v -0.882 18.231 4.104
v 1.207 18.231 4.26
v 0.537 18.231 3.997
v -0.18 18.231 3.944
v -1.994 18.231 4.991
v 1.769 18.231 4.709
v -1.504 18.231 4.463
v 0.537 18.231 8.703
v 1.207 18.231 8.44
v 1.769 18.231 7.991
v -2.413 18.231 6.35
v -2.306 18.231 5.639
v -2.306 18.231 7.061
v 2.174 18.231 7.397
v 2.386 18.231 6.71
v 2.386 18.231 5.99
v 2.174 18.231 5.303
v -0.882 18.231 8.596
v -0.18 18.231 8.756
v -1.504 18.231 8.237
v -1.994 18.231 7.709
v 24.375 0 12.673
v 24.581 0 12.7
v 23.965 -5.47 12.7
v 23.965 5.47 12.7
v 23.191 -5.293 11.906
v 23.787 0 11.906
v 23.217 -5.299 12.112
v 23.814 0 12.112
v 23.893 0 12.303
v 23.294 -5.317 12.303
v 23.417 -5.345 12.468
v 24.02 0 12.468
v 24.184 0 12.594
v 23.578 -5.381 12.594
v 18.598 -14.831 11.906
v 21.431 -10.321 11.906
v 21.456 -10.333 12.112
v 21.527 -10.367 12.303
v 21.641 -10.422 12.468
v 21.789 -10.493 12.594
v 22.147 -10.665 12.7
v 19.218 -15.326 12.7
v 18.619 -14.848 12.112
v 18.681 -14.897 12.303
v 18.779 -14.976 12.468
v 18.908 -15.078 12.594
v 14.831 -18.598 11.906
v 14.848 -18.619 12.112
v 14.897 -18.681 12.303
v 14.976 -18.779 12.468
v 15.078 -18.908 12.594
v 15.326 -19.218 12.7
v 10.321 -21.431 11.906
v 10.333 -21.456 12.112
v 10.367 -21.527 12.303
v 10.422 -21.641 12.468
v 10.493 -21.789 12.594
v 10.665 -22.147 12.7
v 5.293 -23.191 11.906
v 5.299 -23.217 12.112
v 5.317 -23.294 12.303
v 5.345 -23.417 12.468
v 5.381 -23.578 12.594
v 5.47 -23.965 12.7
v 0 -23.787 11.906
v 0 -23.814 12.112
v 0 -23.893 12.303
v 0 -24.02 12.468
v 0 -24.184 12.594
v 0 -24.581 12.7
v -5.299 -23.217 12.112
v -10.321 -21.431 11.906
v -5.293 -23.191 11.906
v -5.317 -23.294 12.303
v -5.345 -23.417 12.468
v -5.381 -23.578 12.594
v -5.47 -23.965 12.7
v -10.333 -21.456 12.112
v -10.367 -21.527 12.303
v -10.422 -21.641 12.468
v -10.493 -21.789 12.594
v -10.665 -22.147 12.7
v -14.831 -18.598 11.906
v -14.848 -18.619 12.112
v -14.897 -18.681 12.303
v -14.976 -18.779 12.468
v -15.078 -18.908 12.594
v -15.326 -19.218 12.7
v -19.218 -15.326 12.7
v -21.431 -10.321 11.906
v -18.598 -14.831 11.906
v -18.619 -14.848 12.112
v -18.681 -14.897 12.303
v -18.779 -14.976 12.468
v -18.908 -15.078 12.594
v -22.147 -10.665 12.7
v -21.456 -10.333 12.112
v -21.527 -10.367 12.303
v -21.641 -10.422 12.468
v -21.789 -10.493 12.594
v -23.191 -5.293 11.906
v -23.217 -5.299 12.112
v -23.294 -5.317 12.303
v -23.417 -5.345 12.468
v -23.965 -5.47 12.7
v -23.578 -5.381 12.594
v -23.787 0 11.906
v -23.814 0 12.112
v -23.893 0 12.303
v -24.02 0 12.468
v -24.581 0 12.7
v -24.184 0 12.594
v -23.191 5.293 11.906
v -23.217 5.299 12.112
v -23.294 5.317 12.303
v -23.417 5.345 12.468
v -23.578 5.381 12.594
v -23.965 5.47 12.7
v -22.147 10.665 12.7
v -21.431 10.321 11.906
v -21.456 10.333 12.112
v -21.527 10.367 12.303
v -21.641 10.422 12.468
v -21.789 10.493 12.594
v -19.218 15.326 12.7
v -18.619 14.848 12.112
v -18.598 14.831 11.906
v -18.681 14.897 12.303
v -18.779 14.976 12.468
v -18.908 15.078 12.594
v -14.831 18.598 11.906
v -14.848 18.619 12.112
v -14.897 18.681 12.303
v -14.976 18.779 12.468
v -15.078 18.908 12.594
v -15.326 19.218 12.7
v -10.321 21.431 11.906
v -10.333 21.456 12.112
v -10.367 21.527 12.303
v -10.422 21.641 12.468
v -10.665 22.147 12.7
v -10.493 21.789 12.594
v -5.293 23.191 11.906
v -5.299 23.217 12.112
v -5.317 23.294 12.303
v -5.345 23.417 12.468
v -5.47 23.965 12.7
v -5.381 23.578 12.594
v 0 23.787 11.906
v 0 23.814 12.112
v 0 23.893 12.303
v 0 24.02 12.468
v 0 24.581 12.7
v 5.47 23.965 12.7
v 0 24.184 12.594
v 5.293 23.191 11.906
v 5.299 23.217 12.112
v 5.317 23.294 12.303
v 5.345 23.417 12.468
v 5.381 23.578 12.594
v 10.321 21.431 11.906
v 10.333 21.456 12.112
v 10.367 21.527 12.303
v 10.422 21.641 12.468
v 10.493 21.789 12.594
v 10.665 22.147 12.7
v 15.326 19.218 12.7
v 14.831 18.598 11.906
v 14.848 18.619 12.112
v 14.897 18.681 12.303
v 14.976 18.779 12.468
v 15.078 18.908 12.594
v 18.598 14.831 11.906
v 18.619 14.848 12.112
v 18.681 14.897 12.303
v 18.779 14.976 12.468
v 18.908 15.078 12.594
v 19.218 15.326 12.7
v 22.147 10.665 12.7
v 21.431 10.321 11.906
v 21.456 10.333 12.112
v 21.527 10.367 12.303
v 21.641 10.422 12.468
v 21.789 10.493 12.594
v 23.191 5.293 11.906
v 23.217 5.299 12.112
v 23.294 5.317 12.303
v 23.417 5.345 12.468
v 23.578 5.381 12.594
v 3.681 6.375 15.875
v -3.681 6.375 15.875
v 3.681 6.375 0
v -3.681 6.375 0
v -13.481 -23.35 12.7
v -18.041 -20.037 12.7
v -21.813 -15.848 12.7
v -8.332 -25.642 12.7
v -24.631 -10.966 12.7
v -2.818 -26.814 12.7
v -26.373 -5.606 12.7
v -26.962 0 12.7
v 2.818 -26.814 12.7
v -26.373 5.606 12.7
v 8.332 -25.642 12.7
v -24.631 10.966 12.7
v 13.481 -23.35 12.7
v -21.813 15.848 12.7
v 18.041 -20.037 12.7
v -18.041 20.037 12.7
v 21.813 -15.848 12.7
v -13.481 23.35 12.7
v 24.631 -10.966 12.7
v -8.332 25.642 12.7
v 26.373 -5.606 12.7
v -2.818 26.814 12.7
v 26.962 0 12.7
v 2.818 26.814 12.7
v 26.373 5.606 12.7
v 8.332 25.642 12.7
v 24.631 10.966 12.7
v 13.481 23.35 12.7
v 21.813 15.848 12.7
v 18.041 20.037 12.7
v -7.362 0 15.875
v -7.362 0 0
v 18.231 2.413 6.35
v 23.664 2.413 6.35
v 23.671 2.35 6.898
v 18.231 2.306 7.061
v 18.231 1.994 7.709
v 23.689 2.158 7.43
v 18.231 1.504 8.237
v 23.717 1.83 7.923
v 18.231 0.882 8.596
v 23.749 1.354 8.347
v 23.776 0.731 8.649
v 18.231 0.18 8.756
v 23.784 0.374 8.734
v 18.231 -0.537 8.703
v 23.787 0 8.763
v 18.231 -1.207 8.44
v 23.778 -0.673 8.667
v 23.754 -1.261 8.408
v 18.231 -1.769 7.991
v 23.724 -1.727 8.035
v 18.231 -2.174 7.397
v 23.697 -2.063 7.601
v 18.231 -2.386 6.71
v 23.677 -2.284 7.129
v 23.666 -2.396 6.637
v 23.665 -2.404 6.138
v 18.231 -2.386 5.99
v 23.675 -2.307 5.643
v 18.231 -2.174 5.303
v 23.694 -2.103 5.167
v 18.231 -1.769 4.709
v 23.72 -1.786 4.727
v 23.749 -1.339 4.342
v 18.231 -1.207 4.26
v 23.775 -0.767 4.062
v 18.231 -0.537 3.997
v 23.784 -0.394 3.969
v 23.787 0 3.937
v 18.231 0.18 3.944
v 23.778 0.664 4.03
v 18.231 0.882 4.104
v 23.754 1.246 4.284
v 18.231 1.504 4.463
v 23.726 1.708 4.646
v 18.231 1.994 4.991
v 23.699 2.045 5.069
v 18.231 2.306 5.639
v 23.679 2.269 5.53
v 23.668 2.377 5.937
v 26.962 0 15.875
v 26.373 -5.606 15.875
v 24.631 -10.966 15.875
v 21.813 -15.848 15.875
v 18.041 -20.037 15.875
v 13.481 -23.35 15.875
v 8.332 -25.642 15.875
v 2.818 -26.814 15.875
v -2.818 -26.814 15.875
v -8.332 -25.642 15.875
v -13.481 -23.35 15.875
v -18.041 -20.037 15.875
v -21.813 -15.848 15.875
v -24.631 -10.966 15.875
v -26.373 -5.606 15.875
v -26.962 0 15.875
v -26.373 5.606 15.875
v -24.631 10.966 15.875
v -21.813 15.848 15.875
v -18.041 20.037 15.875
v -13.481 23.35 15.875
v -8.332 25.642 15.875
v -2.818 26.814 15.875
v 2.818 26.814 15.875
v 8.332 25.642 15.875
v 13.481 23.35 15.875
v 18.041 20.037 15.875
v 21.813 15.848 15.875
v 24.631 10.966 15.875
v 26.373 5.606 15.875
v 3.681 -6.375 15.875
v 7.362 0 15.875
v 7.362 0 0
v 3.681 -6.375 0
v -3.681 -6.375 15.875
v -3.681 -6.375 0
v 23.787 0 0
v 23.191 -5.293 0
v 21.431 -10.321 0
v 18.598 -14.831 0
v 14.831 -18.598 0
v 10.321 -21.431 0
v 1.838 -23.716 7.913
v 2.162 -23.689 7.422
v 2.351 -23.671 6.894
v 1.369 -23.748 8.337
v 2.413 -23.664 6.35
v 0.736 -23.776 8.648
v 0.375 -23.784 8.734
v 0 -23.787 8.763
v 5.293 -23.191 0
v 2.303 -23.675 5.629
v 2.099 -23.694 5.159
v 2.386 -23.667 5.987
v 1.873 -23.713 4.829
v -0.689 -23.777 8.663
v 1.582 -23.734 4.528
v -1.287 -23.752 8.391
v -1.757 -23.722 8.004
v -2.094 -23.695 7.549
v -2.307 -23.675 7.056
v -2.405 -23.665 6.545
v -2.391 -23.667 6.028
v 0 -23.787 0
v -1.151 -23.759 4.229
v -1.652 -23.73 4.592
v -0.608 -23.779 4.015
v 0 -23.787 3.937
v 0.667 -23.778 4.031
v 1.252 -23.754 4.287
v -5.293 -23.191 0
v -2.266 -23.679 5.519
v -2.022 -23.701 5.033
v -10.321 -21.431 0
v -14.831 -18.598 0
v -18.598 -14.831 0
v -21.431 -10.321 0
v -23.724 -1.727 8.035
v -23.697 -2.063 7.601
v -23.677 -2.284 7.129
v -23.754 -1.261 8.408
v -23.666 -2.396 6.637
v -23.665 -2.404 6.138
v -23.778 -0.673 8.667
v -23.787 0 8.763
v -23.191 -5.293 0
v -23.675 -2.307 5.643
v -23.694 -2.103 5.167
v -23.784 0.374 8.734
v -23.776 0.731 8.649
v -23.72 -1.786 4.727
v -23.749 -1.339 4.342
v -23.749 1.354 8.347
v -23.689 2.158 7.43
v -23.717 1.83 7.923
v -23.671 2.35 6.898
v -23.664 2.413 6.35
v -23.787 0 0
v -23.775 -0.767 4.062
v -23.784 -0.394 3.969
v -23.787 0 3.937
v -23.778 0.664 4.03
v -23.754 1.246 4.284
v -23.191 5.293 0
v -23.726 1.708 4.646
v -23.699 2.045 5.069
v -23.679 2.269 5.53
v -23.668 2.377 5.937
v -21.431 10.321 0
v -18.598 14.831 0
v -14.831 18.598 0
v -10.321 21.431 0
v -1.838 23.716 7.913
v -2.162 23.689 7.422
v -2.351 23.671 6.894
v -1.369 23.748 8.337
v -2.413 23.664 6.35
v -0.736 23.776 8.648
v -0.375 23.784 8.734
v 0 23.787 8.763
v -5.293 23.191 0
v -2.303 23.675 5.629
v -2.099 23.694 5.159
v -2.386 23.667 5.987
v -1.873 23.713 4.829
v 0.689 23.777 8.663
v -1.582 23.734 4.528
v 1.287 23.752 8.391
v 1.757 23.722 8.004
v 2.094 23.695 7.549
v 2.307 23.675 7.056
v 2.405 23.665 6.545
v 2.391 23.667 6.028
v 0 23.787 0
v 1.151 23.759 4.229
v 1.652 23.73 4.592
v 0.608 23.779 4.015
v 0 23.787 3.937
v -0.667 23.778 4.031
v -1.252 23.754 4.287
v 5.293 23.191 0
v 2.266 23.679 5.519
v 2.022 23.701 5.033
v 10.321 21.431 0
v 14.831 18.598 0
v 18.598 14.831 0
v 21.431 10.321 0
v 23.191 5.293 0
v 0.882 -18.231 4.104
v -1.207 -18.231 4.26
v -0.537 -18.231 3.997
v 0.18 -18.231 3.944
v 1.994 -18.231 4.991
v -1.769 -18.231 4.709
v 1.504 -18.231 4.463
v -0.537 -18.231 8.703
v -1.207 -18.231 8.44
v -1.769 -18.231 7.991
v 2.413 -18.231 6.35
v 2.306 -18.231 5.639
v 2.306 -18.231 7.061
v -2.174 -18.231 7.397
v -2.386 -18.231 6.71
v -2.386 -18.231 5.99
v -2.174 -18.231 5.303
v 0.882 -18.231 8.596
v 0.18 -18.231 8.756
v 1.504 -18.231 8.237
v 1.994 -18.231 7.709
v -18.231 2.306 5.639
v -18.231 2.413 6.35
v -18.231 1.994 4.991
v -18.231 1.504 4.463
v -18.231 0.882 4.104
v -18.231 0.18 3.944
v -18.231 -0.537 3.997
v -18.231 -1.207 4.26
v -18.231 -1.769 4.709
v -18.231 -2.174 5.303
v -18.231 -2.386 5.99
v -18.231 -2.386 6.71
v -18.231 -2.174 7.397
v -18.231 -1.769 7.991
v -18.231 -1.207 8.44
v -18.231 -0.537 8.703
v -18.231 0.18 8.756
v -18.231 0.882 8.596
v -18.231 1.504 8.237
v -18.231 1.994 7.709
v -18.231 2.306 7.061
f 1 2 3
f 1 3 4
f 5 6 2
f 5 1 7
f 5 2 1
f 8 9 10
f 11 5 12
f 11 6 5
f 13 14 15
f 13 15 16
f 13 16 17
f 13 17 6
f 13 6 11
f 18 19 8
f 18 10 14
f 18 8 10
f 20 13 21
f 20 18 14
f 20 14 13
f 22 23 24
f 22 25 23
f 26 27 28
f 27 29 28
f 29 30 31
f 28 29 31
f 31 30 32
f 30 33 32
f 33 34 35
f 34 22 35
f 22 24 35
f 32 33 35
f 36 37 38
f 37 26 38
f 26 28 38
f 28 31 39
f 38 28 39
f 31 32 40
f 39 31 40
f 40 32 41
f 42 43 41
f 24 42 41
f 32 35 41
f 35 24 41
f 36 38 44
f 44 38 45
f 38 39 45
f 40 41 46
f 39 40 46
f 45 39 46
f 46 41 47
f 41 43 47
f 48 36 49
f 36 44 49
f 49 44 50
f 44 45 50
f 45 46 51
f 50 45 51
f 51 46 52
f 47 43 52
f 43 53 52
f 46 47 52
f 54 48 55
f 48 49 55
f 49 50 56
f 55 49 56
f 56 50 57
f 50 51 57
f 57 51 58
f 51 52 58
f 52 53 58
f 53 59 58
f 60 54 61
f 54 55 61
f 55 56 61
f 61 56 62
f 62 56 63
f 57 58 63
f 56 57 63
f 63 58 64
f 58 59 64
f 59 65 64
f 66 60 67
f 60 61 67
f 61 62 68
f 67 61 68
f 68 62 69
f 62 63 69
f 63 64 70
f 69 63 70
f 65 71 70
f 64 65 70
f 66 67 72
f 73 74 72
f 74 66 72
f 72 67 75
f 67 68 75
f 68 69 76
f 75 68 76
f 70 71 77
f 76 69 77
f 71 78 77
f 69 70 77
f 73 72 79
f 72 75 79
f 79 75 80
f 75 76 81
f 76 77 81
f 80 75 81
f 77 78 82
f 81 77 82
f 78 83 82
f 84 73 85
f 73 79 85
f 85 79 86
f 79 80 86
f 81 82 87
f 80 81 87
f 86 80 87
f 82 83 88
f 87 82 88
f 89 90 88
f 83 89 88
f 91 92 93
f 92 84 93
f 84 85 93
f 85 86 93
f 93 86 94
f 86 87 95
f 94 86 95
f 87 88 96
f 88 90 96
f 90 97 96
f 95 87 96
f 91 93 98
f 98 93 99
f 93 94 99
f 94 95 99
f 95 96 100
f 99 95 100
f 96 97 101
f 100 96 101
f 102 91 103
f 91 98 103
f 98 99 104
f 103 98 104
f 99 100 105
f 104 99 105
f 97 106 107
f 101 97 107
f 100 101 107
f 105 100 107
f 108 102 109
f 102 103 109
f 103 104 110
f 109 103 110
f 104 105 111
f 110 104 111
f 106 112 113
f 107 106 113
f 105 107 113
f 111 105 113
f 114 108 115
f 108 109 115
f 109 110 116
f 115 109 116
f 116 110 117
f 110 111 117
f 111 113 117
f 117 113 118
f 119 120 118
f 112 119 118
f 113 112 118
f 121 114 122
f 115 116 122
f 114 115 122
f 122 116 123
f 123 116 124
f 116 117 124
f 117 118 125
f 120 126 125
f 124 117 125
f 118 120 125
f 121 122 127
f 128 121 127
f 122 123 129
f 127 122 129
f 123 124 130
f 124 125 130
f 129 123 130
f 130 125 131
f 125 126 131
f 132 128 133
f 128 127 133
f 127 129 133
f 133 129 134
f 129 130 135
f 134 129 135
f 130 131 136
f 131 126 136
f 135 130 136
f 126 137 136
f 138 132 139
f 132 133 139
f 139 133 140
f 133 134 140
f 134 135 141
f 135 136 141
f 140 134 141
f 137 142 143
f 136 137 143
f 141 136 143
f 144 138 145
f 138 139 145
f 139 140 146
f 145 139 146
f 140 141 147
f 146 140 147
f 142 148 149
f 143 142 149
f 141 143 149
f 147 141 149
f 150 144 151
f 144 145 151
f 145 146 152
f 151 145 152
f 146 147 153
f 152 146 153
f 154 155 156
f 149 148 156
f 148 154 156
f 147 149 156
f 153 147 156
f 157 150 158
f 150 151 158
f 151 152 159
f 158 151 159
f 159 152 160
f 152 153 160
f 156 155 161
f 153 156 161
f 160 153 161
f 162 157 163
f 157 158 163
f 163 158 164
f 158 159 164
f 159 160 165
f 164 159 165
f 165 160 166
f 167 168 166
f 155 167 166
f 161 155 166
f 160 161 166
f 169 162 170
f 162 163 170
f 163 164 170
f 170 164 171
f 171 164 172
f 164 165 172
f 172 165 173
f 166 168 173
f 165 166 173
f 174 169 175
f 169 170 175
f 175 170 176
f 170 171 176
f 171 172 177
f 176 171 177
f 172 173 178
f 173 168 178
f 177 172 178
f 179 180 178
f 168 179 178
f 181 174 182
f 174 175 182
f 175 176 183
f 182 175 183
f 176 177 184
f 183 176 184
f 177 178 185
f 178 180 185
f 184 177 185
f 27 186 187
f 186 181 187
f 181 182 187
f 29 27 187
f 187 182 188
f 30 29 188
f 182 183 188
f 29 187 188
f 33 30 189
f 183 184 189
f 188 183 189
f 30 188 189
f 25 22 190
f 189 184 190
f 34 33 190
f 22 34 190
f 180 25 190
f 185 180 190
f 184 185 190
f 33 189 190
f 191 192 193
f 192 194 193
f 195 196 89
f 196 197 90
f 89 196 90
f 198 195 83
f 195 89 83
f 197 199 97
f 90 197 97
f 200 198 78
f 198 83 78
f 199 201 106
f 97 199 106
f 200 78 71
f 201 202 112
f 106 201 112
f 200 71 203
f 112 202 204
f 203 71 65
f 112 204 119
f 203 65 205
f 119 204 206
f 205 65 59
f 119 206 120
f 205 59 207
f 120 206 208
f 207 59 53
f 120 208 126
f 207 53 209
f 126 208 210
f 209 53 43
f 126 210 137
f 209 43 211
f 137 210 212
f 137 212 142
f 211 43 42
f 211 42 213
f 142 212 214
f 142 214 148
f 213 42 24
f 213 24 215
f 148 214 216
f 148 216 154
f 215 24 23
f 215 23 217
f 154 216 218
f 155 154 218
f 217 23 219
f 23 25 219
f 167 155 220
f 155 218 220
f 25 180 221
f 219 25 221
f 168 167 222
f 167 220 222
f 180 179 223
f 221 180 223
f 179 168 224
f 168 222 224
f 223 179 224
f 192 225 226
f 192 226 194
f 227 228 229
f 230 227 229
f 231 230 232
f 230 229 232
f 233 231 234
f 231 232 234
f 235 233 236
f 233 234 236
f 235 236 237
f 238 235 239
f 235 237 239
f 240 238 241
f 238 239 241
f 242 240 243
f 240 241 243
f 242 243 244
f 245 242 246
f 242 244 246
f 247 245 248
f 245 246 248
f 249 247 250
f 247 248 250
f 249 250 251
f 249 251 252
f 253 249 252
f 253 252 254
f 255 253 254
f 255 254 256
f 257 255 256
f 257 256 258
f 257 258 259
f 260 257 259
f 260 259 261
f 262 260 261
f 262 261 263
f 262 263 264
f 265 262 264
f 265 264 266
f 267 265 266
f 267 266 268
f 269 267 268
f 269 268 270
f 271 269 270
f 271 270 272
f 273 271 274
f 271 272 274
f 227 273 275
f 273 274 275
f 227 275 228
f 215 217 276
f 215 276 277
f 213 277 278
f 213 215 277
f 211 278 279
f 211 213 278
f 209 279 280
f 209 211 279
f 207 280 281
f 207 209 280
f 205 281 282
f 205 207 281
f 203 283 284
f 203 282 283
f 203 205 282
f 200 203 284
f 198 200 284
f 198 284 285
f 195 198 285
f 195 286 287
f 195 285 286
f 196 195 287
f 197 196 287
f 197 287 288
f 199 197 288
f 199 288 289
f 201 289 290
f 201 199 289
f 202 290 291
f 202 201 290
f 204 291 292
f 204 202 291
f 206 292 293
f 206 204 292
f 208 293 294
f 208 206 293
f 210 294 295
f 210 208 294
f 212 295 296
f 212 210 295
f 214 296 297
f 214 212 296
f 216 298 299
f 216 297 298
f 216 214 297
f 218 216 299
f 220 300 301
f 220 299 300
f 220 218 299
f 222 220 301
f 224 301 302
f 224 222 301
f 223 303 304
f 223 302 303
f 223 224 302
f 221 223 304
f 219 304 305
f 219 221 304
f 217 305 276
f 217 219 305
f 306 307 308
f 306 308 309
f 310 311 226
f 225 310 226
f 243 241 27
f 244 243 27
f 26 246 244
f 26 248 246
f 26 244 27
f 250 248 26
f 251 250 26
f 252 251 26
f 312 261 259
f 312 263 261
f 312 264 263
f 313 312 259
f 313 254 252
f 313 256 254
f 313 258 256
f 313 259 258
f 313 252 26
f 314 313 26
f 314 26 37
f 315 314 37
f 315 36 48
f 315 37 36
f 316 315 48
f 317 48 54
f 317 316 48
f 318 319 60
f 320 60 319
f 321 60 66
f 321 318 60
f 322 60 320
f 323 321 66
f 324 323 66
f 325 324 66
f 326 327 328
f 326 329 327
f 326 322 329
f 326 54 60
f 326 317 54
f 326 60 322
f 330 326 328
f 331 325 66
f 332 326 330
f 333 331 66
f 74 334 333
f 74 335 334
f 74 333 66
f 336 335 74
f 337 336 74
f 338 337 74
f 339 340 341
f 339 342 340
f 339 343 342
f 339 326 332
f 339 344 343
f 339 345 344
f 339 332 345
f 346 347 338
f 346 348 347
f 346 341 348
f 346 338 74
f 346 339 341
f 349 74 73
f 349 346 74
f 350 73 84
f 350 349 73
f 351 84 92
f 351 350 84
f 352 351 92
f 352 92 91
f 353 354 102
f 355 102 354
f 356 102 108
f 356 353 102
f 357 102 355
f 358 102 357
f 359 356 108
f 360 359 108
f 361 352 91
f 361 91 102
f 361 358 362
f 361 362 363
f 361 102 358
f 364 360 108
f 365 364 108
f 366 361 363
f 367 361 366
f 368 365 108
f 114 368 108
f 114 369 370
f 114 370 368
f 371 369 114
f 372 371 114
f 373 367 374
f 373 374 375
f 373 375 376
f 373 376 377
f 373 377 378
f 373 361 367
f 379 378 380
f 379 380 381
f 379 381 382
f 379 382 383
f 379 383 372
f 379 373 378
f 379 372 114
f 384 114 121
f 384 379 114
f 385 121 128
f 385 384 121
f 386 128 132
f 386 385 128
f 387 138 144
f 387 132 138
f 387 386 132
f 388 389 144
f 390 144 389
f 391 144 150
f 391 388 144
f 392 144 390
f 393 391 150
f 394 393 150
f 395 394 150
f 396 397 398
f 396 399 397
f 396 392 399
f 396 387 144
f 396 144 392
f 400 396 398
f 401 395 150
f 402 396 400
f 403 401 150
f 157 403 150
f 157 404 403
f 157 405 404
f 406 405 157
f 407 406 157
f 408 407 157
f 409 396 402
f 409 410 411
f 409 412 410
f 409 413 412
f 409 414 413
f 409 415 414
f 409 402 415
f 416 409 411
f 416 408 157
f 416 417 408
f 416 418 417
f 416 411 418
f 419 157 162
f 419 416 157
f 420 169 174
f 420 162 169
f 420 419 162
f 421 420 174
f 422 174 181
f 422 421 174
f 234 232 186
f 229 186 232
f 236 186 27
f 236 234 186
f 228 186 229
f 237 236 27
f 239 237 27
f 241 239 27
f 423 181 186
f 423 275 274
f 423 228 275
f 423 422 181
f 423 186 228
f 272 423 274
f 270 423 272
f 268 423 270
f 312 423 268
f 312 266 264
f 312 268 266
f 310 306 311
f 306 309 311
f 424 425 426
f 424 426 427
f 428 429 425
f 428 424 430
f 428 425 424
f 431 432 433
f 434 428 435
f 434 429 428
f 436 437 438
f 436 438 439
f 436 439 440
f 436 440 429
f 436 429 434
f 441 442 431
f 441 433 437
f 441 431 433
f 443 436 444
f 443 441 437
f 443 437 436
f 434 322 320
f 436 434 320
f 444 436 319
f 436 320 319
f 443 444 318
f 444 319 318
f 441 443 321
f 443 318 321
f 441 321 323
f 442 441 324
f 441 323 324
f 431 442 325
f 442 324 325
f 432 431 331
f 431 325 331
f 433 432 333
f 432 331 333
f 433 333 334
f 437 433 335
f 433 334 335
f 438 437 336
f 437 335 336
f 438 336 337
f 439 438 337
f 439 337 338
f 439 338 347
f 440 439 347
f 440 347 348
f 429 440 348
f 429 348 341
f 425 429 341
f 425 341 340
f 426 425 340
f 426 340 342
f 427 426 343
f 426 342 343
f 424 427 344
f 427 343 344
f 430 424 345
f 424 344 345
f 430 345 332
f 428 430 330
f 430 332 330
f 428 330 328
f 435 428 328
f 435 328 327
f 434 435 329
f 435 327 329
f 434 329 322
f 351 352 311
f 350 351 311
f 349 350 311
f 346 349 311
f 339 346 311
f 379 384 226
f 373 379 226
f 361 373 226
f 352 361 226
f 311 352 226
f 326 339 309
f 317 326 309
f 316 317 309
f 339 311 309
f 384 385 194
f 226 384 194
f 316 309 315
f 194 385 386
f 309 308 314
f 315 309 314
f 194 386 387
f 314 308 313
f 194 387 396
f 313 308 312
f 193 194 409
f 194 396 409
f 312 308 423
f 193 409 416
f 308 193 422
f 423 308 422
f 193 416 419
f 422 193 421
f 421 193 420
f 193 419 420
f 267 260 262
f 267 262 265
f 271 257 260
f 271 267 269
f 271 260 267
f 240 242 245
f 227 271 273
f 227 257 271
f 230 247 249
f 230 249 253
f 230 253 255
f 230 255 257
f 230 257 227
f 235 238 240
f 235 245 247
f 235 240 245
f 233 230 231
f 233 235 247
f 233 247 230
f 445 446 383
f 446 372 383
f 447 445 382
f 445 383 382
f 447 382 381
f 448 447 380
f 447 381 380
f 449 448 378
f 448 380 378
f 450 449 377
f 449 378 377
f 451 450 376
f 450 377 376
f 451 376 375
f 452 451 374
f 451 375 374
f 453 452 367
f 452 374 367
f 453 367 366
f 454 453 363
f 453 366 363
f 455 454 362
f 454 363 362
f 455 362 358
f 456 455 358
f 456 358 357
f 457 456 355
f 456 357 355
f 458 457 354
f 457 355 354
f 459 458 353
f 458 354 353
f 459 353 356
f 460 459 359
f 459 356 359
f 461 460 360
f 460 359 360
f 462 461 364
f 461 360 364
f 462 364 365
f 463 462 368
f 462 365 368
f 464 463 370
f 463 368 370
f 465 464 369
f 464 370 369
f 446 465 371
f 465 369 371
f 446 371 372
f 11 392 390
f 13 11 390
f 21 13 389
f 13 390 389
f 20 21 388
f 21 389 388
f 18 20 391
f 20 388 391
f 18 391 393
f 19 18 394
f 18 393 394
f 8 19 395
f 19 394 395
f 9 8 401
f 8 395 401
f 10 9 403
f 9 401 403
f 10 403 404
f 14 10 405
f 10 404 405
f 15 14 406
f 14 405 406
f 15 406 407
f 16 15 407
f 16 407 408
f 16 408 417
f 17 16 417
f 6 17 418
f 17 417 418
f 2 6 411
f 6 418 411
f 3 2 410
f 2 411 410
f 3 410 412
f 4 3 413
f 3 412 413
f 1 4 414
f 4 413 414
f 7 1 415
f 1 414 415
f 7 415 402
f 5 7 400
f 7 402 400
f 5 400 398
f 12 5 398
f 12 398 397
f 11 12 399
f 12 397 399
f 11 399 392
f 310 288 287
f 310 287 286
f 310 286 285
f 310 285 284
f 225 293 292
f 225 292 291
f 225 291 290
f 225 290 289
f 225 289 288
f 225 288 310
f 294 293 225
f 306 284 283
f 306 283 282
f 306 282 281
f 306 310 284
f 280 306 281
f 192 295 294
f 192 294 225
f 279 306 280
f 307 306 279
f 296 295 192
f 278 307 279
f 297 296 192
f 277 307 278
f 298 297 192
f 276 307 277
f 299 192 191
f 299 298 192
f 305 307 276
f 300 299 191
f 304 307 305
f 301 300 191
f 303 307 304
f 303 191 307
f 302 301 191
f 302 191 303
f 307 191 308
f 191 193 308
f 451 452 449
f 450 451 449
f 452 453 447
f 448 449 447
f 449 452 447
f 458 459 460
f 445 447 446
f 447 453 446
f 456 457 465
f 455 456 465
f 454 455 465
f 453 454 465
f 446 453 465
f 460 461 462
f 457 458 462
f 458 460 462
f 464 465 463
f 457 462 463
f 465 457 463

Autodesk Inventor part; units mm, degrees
sketch "Sketch1" plane through (0, 0, 0) normal (0, 0, 1) x (1, 0, 0)
  circle A0 centre (0, 0) radius 23.7871
  line L0 (3.6808, 6.3754) -> (7.3617, 0)
  line L1 (7.3617, 0) -> (3.6808, -6.3754)
  line L2 (3.6808, -6.3754) -> (-3.6808, -6.3754)
  line L3 (-3.6808, -6.3754) -> (-7.3617, 0)
  line L4 (-7.3617, 0) -> (-3.6808, 6.3754)
  line L5 (-3.6808, 6.3754) -> (3.6808, 6.3754)
  dimension "d0" = 47.5742
  dimension "d2" = 12.7508
extrude "Extrusion1" add sketch "Sketch1" along normal blind 12.7
ref_plane "Work Plane1" through (0, 23.7871, 0) normal (0, 1, 0) x (-1, 0, 0)
sketch "Sketch2" plane through (0, 23.7871, 0) normal (0, 1, 0) x (-1, 0, 0)
  line L0 (23.7871, 12.7) -> (-23.7871, 12.7) projected
  line L1 (-23.7871, 0) -> (23.7871, 0) projected
  circle A0 centre (0, 6.35) radius 2.413
  line L2 (0, 0) -> (0, 12.7) construction
  dimension "d5" = 4.826
  dimension "d6" = 6.35
extrude "Extrusion2" cut sketch "Sketch2" against normal blind 5.5563
ref_plane "Work Plane2" through (0, -23.7871, 0) normal (0, -1, 0) x (1, 0, 0)
sketch "Sketch3" plane through (0, -23.7871, 0) normal (0, -1, 0) x (1, 0, 0)
  circle A0 centre (0, 6.35) radius 2.413
  line L0 (23.7871, 12.7) -> (-23.7871, 12.7) projected
  line L1 (0, 0) -> (0, 12.7) construction
  dimension "d9" = 4.826
  dimension "d10" = 6.35
extrude "Extrusion3" cut sketch "Sketch3" against normal blind 5.5563
ref_plane "Work Plane4" through (23.7871, 0, 0) normal (1, 0, 0) x (0, 1, 0)
ref_plane "Work Plane3" through (7.3617, 0, 0) normal (1, 0, 0) x (0, 0, 1)
sketch "Sketch4" plane through (23.7871, 0, 0) normal (1, 0, 0) x (0, 1, 0)
  line L0 (23.7871, 12.7) -> (-23.7871, 12.7) projected
  circle A0 centre (0, 6.35) radius 2.413
  line L1 (0, 0) -> (0, 12.7) construction
  dimension "d14" = 4.826
  dimension "d15" = 6.35
extrude "Extrusion4" cut sketch "Sketch4" against normal blind 5.5563
ref_plane "Work Plane5" through (-23.7871, 0, 0) normal (1, 0, 0) x (0, 1, 0)
sketch "Sketch5" plane through (-23.7871, 0, 0) normal (1, 0, 0) x (0, 1, 0)
  line L0 (-23.7871, 0) -> (23.7871, 0) projected
  circle A0 centre (0, 6.35) radius 2.413
  line L1 (0, 12.6521) -> (0, 0) construction
  dimension "d18" = 4.826
  dimension "d19" = 6.35
extrude "Extrusion5" cut sketch "Sketch5" along normal blind 5.5563
sketch "Sketch6" plane through (0, 0, 12.7) normal (0, 0, 1) x (1, 0, 0)
  line L0 (7.3617, 0) -> (3.6808, -6.3754) projected
  line L1 (3.6808, -6.3754) -> (-3.6808, -6.3754) projected
  line L2 (-3.6808, -6.3754) -> (-7.3617, 0) projected
  line L3 (-7.3617, 0) -> (-3.6808, 6.3754) projected
  line L4 (-3.6808, 6.3754) -> (3.6808, 6.3754) projected
  line L5 (3.6808, 6.3754) -> (7.3617, 0) projected
  circle A0 centre (0, 0) radius 23.7871 projected
  circle A1 centre (0, 0) radius 26.9621
  dimension "d26" = 3.175
extrude "Extrusion6" add sketch "Sketch6" along normal blind 3.175 contours A0 | A1
fillet "Fillet1" radius 0.7937 1 edges at (-23.7871, 0, 12.7)
properties part number "Roller End Cap Drive (3-D Printed)" material "ABS Plastic"
